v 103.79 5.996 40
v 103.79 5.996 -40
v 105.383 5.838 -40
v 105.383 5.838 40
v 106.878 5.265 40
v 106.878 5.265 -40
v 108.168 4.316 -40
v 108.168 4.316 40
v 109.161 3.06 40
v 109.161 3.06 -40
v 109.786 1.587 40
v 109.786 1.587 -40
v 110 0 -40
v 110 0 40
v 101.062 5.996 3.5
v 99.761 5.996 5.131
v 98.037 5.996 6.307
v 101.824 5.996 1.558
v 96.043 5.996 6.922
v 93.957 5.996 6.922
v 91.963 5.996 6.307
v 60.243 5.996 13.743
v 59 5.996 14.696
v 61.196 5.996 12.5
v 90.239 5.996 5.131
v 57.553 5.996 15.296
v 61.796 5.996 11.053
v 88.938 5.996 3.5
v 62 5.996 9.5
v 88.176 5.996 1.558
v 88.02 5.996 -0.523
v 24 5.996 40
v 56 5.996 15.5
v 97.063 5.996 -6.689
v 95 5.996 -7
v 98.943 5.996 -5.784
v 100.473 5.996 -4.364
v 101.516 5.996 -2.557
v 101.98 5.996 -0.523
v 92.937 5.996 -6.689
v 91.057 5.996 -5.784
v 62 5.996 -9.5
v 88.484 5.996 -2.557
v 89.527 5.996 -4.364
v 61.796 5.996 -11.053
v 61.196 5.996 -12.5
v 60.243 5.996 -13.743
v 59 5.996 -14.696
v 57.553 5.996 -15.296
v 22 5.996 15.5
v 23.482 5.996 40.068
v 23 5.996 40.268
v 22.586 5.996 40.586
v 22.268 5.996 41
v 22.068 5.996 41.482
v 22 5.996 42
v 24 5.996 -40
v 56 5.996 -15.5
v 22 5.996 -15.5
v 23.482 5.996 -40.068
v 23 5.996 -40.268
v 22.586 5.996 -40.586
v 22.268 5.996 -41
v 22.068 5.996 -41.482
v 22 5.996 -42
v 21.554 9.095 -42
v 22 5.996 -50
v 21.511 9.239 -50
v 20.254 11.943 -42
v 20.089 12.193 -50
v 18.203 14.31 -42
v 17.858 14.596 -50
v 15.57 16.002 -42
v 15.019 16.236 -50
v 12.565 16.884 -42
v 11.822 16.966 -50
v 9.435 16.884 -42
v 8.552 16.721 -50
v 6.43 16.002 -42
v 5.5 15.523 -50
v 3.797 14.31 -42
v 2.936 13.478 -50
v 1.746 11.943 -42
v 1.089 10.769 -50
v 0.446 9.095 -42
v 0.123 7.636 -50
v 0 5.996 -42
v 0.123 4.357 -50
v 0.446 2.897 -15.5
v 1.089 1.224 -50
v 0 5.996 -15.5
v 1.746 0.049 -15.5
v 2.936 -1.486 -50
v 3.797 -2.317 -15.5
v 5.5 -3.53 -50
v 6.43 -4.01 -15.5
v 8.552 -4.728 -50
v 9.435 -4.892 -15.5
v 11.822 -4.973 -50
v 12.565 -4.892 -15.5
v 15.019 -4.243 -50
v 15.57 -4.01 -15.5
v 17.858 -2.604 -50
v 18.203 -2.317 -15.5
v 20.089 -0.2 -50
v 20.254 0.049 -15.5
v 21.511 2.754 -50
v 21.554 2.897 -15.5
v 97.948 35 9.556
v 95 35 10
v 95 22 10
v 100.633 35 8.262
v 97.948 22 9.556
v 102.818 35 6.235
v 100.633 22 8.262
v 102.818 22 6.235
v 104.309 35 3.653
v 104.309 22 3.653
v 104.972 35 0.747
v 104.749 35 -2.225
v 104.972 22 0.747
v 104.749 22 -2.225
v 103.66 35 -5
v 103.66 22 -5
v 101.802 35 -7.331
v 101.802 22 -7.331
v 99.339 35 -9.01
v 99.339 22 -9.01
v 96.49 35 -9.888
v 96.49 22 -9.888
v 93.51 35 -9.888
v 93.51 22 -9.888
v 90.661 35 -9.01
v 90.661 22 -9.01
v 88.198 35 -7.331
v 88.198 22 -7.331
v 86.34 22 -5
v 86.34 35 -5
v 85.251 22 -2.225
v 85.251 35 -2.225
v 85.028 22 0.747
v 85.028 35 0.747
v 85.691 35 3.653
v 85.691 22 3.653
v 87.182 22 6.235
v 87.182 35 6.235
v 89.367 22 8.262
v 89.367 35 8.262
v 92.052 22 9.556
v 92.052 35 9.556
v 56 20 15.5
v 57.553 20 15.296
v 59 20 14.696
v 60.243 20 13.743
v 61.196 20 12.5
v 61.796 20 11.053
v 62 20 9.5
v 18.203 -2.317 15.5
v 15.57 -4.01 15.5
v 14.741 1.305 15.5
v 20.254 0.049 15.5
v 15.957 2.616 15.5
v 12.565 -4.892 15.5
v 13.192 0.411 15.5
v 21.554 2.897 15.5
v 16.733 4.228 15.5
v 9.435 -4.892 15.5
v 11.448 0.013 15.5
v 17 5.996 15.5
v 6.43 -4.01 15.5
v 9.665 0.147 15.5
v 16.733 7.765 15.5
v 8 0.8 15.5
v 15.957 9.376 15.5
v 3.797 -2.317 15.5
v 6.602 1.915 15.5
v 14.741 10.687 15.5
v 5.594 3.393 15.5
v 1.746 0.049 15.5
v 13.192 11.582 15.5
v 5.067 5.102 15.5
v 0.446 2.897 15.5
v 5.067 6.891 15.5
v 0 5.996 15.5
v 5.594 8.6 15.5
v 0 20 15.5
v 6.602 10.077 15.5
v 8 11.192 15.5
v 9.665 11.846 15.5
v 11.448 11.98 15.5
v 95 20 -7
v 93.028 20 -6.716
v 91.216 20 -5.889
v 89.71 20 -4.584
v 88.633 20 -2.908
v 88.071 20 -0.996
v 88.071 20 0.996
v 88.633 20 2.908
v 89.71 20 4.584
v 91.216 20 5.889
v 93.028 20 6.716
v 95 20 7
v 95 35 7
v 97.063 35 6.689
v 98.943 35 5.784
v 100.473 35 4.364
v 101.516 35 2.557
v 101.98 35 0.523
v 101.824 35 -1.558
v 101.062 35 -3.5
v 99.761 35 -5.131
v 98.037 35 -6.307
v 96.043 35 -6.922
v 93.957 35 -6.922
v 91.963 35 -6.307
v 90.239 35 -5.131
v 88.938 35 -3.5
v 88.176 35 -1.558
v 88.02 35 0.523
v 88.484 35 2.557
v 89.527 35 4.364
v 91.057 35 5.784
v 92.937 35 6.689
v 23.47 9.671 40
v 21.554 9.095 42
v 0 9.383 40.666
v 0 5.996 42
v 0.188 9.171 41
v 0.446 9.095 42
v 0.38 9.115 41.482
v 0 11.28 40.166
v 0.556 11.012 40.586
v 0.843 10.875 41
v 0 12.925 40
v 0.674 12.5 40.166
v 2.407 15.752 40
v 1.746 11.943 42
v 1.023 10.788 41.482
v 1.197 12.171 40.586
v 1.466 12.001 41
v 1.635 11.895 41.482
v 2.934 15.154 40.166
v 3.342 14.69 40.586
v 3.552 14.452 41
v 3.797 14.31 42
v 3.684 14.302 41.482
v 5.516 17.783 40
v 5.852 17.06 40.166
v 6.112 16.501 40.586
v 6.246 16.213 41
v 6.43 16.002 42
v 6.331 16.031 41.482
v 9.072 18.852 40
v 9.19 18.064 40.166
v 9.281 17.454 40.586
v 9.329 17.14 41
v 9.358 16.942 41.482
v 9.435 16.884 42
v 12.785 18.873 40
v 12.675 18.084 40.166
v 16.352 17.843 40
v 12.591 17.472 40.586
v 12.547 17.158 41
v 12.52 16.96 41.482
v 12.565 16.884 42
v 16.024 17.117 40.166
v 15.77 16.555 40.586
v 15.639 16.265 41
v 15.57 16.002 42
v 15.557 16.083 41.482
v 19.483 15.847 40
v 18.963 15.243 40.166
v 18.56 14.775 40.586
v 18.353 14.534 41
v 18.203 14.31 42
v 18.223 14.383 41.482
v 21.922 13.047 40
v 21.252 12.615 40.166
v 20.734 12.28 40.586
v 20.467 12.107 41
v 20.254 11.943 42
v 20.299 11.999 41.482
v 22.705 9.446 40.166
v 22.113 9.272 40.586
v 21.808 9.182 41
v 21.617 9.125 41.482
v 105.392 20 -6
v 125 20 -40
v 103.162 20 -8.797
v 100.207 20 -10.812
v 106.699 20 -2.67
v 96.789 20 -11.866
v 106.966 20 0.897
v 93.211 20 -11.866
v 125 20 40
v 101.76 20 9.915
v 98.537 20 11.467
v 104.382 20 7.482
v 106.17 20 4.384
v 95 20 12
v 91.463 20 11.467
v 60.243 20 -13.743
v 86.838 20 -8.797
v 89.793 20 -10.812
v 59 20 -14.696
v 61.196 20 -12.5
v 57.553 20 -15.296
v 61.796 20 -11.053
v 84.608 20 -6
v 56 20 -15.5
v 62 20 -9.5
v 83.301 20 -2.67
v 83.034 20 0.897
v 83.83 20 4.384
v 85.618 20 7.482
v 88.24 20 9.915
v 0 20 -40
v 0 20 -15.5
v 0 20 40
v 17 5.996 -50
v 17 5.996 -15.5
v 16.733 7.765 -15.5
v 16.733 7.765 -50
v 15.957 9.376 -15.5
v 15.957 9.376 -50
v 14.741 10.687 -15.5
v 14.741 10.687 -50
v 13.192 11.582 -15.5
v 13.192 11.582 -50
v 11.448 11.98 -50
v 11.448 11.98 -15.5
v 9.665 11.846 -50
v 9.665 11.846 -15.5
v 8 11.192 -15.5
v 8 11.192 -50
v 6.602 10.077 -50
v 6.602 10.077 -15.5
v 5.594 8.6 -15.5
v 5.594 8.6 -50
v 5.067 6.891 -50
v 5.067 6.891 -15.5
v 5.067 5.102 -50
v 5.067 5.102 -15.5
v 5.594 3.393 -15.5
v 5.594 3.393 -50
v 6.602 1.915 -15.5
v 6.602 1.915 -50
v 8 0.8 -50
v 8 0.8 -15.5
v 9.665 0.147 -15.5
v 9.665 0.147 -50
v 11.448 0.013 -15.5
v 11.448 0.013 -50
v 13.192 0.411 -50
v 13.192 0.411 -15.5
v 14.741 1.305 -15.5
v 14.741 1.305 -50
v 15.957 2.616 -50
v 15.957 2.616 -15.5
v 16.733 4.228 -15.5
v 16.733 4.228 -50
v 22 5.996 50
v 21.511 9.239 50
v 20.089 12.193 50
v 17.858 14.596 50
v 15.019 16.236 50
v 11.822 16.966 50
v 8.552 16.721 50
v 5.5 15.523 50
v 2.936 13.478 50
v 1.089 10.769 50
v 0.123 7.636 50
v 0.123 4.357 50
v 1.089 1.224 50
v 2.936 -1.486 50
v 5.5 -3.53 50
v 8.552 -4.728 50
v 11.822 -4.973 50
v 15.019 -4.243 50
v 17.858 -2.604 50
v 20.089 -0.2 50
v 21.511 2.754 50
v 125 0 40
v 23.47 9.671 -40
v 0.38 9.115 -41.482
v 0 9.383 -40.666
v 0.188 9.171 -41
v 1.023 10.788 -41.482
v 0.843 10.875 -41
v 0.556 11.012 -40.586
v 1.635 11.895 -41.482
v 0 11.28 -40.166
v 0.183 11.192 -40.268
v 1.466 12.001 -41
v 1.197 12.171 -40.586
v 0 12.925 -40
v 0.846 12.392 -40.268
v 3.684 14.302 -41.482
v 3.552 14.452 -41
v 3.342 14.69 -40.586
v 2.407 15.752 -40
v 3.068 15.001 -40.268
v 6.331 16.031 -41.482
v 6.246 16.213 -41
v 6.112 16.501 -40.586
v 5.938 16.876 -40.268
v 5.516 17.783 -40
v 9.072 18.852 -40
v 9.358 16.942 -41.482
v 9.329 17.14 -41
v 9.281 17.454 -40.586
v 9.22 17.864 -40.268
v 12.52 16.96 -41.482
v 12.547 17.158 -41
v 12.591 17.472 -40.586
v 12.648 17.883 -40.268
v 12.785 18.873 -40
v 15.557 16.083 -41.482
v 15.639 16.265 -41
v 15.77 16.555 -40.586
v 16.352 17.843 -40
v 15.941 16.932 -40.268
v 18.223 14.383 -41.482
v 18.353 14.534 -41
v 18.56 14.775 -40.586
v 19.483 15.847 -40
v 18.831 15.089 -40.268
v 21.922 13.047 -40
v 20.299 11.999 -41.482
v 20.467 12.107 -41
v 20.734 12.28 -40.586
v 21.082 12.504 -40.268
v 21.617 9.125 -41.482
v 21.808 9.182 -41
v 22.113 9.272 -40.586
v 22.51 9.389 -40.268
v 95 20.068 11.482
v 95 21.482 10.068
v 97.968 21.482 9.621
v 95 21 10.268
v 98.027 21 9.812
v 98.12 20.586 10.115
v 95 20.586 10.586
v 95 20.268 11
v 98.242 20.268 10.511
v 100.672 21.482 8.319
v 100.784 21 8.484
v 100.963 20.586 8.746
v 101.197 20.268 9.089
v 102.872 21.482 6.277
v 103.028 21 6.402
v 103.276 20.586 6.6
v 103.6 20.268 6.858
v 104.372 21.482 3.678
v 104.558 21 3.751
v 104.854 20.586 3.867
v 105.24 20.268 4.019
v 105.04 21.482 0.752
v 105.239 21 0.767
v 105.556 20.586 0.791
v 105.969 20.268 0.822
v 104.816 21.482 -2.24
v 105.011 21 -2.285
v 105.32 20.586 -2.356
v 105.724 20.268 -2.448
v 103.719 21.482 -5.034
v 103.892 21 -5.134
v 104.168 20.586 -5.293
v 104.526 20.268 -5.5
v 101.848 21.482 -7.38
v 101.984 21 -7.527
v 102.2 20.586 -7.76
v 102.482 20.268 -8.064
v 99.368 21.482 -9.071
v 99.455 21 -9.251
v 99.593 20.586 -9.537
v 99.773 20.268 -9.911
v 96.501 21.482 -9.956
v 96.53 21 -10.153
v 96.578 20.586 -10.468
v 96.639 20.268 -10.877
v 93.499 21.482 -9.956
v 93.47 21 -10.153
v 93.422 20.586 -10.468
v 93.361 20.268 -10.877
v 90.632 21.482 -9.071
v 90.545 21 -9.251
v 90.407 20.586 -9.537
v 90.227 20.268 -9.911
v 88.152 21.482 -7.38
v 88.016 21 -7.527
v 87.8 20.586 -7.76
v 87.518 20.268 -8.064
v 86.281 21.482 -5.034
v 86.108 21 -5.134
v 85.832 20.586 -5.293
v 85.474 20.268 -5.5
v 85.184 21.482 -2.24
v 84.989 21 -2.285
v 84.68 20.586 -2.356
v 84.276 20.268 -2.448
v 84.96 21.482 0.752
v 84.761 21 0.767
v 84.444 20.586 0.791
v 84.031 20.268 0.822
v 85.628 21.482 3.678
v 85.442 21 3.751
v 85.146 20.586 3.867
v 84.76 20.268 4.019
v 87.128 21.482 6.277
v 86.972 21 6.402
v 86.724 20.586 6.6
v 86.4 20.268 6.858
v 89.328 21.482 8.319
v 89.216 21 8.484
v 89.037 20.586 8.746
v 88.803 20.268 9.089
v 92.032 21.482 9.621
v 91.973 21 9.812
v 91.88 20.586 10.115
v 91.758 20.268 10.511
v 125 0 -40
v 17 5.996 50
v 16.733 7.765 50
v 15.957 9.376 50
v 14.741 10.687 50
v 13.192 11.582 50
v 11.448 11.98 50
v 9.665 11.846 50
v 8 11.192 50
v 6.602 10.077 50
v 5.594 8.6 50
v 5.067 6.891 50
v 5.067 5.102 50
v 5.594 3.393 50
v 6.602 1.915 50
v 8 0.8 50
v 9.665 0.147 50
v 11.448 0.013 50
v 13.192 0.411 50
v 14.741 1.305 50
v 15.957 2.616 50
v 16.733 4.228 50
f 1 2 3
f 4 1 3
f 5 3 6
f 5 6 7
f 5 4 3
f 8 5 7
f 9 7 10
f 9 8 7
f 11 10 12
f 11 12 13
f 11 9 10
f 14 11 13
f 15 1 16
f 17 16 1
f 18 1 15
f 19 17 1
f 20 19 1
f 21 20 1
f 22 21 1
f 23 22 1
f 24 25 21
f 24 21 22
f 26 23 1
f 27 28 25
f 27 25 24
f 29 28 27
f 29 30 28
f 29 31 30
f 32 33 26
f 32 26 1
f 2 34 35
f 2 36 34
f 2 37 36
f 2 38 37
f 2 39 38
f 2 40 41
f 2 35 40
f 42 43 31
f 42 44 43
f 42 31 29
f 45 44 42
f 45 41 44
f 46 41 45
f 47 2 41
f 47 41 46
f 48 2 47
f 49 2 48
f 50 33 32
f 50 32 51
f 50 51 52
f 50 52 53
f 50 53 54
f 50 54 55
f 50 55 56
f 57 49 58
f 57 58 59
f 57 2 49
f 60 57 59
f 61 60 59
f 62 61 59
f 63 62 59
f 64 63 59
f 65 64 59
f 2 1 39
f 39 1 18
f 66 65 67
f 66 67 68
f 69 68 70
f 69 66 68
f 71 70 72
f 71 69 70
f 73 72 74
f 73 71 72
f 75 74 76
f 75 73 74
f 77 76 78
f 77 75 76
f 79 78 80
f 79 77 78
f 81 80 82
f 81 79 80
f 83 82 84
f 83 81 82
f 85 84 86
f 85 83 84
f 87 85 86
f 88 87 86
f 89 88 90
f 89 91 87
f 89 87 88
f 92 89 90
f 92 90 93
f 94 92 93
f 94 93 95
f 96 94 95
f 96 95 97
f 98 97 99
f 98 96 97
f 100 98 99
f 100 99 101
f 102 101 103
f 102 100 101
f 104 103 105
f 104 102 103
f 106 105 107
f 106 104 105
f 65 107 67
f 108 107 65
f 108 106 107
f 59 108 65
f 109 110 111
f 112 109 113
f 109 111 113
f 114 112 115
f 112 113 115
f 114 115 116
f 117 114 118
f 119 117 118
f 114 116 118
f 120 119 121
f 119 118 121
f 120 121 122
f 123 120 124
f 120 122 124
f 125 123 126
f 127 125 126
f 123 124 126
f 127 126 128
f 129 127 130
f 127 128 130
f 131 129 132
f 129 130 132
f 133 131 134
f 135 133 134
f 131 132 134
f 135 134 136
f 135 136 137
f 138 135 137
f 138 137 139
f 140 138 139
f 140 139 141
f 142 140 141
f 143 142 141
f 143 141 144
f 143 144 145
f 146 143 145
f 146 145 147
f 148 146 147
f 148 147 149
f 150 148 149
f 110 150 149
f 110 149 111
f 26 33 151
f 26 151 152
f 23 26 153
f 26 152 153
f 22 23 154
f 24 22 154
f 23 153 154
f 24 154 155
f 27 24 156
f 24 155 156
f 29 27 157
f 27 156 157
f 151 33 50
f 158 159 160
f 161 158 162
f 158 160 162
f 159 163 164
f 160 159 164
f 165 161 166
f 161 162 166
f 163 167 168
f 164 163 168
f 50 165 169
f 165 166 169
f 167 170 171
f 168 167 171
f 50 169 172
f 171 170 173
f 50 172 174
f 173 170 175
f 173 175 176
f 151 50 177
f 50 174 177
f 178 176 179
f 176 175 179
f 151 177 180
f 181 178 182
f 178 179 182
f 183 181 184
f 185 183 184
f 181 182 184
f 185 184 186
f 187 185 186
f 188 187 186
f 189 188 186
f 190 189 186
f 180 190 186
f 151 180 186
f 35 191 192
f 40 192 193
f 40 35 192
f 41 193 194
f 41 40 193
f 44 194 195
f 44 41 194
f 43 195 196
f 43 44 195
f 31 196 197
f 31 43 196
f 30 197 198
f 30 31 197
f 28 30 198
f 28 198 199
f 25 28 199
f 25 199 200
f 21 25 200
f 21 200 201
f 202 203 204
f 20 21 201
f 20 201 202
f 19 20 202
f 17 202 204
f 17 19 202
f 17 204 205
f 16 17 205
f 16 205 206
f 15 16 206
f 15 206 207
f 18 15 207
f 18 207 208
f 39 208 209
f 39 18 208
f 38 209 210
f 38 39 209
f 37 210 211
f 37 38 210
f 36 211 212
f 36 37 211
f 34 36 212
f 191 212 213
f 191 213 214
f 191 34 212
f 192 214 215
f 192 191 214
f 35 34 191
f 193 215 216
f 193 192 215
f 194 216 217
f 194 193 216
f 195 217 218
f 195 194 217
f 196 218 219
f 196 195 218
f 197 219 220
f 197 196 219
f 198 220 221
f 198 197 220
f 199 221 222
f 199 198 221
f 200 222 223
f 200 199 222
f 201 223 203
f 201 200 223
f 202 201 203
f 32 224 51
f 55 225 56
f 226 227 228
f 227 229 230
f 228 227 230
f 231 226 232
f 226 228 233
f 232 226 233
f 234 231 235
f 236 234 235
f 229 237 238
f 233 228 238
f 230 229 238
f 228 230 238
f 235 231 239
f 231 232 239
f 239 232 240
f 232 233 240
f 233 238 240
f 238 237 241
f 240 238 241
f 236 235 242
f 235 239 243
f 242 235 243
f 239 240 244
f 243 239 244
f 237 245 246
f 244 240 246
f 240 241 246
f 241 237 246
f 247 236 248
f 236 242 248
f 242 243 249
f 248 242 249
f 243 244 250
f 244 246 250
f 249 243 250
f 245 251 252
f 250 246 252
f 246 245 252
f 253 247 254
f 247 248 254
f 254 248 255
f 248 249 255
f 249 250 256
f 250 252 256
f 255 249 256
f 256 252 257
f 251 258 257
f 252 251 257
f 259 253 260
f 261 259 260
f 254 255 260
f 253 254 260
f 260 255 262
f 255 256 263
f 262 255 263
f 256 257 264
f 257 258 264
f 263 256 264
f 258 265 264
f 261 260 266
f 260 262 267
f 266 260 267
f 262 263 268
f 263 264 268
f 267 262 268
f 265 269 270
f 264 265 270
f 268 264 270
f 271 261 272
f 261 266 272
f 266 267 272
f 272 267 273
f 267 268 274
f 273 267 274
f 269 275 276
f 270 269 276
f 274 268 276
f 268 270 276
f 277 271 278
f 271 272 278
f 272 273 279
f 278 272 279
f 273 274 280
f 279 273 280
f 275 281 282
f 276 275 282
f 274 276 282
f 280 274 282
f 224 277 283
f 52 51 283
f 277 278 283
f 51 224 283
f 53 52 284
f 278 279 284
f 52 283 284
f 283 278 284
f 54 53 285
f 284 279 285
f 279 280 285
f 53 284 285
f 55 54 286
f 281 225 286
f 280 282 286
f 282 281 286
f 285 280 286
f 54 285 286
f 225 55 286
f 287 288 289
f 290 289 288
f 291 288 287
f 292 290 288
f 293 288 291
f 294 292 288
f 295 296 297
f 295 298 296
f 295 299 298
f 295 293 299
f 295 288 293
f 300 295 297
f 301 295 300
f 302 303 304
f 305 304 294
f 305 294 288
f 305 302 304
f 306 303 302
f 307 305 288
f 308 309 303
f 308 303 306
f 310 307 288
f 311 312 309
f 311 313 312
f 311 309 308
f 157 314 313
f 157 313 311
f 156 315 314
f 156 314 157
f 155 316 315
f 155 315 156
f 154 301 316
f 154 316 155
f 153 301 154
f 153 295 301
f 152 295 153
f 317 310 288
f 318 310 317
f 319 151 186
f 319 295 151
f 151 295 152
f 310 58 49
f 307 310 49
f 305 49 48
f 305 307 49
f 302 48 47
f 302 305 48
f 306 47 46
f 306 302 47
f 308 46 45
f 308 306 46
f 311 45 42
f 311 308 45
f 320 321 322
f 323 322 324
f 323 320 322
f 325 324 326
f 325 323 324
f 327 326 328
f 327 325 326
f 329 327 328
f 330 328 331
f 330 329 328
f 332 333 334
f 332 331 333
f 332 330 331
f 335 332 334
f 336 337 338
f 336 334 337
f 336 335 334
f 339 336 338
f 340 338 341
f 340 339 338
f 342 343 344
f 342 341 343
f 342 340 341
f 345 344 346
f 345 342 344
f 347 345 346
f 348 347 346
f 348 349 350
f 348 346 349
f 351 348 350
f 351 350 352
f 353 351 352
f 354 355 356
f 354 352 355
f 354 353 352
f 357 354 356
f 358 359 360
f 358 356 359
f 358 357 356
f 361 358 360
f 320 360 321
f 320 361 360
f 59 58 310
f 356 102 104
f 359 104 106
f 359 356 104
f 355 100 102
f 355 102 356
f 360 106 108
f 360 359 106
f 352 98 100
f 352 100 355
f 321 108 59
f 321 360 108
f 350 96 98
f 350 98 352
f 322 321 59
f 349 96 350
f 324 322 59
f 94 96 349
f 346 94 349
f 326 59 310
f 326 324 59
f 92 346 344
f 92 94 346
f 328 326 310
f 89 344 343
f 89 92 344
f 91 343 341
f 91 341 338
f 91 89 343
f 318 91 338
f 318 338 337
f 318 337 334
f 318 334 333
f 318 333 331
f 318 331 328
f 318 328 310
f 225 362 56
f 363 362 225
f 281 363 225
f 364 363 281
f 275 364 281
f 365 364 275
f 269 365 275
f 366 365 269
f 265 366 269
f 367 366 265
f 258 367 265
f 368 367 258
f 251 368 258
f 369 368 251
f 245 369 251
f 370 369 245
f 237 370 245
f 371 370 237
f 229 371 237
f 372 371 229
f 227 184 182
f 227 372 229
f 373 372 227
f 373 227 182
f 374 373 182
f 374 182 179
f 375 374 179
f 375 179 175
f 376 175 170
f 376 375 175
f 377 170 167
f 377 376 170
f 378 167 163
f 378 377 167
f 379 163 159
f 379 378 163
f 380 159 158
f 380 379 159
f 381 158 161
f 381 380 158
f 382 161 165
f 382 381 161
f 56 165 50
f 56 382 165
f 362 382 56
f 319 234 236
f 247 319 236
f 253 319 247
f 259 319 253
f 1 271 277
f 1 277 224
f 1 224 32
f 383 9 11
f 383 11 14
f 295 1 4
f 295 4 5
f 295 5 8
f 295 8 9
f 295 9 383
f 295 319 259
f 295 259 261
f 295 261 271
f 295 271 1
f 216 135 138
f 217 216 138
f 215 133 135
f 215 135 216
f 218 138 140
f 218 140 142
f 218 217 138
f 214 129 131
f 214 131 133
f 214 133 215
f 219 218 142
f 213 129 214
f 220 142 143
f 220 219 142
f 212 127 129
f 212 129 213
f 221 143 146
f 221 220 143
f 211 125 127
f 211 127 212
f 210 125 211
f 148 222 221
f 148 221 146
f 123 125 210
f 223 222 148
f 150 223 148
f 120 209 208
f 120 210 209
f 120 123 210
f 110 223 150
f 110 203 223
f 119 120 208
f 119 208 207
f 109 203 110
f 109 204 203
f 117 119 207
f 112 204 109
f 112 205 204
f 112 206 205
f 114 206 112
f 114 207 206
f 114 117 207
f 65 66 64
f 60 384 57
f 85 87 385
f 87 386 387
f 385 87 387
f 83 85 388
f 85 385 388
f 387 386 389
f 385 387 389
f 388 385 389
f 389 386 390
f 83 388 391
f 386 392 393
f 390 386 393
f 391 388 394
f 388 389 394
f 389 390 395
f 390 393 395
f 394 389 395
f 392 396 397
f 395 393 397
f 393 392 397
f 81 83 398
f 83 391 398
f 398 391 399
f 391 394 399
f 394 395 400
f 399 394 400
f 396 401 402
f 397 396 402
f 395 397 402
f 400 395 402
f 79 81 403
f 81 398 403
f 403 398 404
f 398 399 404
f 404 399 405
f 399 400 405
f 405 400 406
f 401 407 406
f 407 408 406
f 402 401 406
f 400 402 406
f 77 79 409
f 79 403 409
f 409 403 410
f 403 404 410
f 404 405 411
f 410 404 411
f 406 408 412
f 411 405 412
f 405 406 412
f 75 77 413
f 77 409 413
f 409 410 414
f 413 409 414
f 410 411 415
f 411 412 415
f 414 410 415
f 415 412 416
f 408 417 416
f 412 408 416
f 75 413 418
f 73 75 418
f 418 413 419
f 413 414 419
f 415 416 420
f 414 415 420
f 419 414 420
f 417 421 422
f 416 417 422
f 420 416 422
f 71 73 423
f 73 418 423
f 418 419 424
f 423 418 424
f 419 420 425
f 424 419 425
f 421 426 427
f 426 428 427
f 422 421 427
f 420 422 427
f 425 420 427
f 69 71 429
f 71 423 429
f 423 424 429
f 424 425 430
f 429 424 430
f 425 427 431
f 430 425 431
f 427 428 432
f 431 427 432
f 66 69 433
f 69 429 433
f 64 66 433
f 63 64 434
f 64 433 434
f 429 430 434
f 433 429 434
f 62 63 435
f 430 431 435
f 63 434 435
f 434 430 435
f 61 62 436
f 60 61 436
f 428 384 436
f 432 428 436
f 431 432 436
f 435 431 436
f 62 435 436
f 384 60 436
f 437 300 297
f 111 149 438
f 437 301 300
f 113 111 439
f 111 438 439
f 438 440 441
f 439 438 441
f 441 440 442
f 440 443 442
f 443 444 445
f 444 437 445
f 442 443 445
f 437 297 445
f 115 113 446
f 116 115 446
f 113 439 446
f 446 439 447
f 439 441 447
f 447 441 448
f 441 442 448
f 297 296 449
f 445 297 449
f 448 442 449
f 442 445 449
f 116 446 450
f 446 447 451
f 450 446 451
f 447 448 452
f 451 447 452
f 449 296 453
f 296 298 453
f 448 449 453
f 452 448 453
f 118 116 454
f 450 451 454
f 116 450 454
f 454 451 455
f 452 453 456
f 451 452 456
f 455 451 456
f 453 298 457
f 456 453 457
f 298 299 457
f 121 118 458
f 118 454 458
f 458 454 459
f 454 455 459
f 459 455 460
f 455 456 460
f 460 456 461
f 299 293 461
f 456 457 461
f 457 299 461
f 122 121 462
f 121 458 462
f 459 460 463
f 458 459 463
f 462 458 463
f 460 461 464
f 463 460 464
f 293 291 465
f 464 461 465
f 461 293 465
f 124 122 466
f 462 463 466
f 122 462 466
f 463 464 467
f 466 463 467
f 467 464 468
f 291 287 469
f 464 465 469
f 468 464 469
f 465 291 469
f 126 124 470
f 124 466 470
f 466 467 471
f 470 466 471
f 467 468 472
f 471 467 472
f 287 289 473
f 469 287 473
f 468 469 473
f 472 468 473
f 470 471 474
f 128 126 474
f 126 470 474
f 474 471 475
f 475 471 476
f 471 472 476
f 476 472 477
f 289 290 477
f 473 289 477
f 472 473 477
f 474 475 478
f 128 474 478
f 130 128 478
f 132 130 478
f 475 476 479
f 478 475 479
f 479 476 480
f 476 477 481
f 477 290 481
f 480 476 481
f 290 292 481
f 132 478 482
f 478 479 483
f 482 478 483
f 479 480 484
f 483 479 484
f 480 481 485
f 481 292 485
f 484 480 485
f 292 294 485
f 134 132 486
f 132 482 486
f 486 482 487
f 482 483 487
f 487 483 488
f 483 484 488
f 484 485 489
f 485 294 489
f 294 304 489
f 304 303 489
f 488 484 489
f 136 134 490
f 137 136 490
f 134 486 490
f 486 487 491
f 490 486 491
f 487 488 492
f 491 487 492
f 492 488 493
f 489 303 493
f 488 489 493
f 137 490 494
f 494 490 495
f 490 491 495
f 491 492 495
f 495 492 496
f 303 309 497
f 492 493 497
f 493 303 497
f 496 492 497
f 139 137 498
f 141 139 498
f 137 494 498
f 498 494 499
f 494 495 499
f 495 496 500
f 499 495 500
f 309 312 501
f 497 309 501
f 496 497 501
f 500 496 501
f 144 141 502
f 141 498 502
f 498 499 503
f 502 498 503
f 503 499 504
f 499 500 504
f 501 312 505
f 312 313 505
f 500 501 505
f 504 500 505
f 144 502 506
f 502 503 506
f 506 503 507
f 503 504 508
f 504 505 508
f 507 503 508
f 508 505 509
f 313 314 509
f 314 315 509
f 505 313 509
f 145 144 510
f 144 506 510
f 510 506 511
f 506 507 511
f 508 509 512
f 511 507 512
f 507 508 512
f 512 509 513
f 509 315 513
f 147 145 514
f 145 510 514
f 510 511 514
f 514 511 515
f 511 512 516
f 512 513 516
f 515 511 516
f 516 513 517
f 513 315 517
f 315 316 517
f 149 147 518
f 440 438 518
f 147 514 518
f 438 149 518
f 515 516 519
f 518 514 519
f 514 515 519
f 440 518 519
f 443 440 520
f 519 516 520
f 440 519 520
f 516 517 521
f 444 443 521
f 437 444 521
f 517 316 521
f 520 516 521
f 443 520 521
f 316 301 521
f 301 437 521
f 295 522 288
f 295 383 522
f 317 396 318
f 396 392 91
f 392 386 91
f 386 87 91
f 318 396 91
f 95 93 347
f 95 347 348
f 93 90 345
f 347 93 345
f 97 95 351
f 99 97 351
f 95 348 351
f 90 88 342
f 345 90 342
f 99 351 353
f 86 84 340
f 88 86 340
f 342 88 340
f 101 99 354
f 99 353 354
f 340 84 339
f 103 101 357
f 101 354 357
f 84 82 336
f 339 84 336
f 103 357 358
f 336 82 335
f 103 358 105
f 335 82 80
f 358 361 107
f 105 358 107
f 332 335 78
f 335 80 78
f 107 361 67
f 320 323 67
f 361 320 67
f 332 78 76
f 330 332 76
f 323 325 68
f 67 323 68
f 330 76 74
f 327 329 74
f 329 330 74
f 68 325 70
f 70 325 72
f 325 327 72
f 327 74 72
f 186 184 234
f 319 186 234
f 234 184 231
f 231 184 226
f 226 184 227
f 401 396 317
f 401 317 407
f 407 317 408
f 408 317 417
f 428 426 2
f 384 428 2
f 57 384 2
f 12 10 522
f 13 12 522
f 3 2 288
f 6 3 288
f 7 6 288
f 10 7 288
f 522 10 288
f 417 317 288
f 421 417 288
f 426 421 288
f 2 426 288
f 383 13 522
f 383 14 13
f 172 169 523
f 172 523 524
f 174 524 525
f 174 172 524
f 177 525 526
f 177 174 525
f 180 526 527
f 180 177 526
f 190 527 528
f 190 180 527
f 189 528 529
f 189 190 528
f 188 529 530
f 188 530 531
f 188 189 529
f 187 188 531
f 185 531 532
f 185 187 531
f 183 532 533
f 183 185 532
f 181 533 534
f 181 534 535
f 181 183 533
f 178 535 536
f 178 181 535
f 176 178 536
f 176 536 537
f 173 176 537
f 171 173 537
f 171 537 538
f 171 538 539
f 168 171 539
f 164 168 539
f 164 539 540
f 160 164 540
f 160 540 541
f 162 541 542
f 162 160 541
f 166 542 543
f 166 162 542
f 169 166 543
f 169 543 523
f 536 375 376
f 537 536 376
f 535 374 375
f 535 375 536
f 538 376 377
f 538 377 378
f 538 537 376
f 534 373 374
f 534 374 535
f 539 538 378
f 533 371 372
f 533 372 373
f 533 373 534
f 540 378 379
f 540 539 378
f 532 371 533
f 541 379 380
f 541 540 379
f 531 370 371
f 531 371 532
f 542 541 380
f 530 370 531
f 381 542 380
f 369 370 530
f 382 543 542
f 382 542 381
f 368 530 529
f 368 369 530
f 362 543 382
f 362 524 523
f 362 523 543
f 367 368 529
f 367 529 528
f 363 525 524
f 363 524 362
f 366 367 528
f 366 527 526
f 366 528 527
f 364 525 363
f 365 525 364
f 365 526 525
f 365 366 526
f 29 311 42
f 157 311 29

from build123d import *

# Parameters (mm, degrees)
BOSS_EXTRUDE3_DEPTH = 40
SKETCH1_5_R         = 11
SKETCH1_5_R_2       = 6
BOSS_EXTRUDE4_DEPTH = 50
SKETCH3_W           = 31
SKETCH3_H           = 25.003683984
CUT_EXTRUDE1_DEPTH  = 62
SKETCH4_R           = 10
SKETCH4_R_2         = 7
BOSS_EXTRUDE5_DEPTH = 15
FILLET1_R           = 2
FILLET2_R           = 6
CUT_EXTRUDE2_START  = -15
SKETCH4_2_R         = 7
CUT_EXTRUDE2_DEPTH  = 15


with BuildPart() as part:
    # Sketch1 → Boss-Extrude3 (new, symmetric)
    with BuildSketch(Plane.XY):
        with BuildLine():
            Line((125, 20), (0, 20))
            Line((0, 20), (0, 5.996316016))
            ThreePointArc((0, 5.996316016), (11, 16.996316016), (22, 5.996316016))
            Line((22, 5.996316016), (103.789775753, 5.996316016))
            ThreePointArc((103.789775753, 5.996316016), (108.167652488, 4.316326302), (110, 0))
            Line((110, 0), (125, 0))
            Line((125, 0), (125, 20))
        make_face()
    extrude(amount=BOSS_EXTRUDE3_DEPTH, both=True)

    # Sketch1<5> → Boss-Extrude4 (add, symmetric)
    with BuildSketch(Plane.XY):
        with Locations((11, 5.996316016)):
            Circle(SKETCH1_5_R)
        with Locations((11, 5.996316016)):
            Circle(SKETCH1_5_R_2, mode=Mode.SUBTRACT)
    extrude(amount=BOSS_EXTRUDE4_DEPTH, both=True)

    # Sketch3 → Cut-Extrude1 (cut)
    with BuildSketch(Plane.ZY):
        with Locations((0, 7.498158008)):
            Rectangle(SKETCH3_W, SKETCH3_H)
    extrude(amount=-CUT_EXTRUDE1_DEPTH, mode=Mode.SUBTRACT)

    # Sketch4 → Boss-Extrude5 (add)
    with BuildSketch(Plane(origin=(0, 20, 0), x_dir=(1, 0, 0), z_dir=(0, 1, 0))):
        with Locations(Location((95, 0, 0), (0, 0, 270))):
            Circle(SKETCH4_R)
        with Locations(Location((95, 0, 0), (0, 0, 270))):
            Circle(SKETCH4_R_2, mode=Mode.SUBTRACT)
    extrude(amount=BOSS_EXTRUDE5_DEPTH)

    # Fillet1
    # the kernel refuses this fillet: 2 mm, written as the material it adds along each edge
    with BuildSketch(Plane(origin=(11, 5.996316016, 40), x_dir=(-1, 0, 0), z_dir=(0, -1, 0))) as fillet1_piece_1_section:
        with BuildLine():
            CenterArc((11 + FILLET1_R, -FILLET1_R), FILLET1_R, 90, 90)
            Line((11 + FILLET1_R, 0), (11, 0))
            Line((11, 0), (11, -FILLET1_R))
        make_face()
    fillet1_piece_1 = revolve(axis=Axis((11, 5.996316016, 40), (0, 0, -1)), revolution_arc=180, mode=Mode.PRIVATE)
    fillet1_piece_1 = split(fillet1_piece_1, bisect_by=Plane(origin=(0, 17.026812535, 41), z_dir=(1, 0, 0)), keep=Keep.TOP, mode=Mode.PRIVATE)
    add(fillet1_piece_1)
    with BuildSketch(Plane(origin=(95, 20, 0), x_dir=(0, 0, 1), z_dir=(-1, 0, 0))) as fillet1_piece_2:
        with BuildLine():
            CenterArc((10 + FILLET1_R, FILLET1_R), FILLET1_R, 180, 90)
            Line((10, FILLET1_R), (10, 0))
            Line((10, 0), (10 + FILLET1_R, 0))
        make_face()
    revolve(axis=Axis((95, 20, 0), (0, 1, 0)))
    with BuildSketch(Plane(origin=(11, 5.996316016, -40), x_dir=(-1, 0, 0), z_dir=(0, -1, 0))) as fillet1_piece_3_section:
        with BuildLine():
            CenterArc((11 + FILLET1_R, FILLET1_R), FILLET1_R, 180, 90)
            Line((11 + FILLET1_R, 0), (11, 0))
            Line((11, 0), (11, FILLET1_R))
        make_face()
    fillet1_piece_3 = revolve(axis=Axis((11, 5.996316016, -40), (0, 0, -1)), revolution_arc=180, mode=Mode.PRIVATE)
    fillet1_piece_3 = split(fillet1_piece_3, bisect_by=Plane(origin=(0, 17.026812535, -41), z_dir=(1, 0, 0)), keep=Keep.TOP, mode=Mode.PRIVATE)
    add(fillet1_piece_3)

    # Fillet2
    fillet2_edges = [part.edges().sort_by_distance(p)[0] for p in [
        (62, 12.998158008, -15.5),
        (62, 12.998158008, 15.5),
    ]]
    fillet(fillet2_edges, radius=FILLET2_R)

    # Sketch4<2> → Cut-Extrude2 (cut)
    with BuildSketch(Plane(origin=(0, 20, 0), x_dir=(1, 0, 0), z_dir=(0, 1, 0)).offset(CUT_EXTRUDE2_START)):
        with Locations(Location((95, 0, 0), (0, 0, 90))):
            Circle(SKETCH4_2_R)
    extrude(amount=CUT_EXTRUDE2_DEPTH, mode=Mode.SUBTRACT)


solid = part.part
